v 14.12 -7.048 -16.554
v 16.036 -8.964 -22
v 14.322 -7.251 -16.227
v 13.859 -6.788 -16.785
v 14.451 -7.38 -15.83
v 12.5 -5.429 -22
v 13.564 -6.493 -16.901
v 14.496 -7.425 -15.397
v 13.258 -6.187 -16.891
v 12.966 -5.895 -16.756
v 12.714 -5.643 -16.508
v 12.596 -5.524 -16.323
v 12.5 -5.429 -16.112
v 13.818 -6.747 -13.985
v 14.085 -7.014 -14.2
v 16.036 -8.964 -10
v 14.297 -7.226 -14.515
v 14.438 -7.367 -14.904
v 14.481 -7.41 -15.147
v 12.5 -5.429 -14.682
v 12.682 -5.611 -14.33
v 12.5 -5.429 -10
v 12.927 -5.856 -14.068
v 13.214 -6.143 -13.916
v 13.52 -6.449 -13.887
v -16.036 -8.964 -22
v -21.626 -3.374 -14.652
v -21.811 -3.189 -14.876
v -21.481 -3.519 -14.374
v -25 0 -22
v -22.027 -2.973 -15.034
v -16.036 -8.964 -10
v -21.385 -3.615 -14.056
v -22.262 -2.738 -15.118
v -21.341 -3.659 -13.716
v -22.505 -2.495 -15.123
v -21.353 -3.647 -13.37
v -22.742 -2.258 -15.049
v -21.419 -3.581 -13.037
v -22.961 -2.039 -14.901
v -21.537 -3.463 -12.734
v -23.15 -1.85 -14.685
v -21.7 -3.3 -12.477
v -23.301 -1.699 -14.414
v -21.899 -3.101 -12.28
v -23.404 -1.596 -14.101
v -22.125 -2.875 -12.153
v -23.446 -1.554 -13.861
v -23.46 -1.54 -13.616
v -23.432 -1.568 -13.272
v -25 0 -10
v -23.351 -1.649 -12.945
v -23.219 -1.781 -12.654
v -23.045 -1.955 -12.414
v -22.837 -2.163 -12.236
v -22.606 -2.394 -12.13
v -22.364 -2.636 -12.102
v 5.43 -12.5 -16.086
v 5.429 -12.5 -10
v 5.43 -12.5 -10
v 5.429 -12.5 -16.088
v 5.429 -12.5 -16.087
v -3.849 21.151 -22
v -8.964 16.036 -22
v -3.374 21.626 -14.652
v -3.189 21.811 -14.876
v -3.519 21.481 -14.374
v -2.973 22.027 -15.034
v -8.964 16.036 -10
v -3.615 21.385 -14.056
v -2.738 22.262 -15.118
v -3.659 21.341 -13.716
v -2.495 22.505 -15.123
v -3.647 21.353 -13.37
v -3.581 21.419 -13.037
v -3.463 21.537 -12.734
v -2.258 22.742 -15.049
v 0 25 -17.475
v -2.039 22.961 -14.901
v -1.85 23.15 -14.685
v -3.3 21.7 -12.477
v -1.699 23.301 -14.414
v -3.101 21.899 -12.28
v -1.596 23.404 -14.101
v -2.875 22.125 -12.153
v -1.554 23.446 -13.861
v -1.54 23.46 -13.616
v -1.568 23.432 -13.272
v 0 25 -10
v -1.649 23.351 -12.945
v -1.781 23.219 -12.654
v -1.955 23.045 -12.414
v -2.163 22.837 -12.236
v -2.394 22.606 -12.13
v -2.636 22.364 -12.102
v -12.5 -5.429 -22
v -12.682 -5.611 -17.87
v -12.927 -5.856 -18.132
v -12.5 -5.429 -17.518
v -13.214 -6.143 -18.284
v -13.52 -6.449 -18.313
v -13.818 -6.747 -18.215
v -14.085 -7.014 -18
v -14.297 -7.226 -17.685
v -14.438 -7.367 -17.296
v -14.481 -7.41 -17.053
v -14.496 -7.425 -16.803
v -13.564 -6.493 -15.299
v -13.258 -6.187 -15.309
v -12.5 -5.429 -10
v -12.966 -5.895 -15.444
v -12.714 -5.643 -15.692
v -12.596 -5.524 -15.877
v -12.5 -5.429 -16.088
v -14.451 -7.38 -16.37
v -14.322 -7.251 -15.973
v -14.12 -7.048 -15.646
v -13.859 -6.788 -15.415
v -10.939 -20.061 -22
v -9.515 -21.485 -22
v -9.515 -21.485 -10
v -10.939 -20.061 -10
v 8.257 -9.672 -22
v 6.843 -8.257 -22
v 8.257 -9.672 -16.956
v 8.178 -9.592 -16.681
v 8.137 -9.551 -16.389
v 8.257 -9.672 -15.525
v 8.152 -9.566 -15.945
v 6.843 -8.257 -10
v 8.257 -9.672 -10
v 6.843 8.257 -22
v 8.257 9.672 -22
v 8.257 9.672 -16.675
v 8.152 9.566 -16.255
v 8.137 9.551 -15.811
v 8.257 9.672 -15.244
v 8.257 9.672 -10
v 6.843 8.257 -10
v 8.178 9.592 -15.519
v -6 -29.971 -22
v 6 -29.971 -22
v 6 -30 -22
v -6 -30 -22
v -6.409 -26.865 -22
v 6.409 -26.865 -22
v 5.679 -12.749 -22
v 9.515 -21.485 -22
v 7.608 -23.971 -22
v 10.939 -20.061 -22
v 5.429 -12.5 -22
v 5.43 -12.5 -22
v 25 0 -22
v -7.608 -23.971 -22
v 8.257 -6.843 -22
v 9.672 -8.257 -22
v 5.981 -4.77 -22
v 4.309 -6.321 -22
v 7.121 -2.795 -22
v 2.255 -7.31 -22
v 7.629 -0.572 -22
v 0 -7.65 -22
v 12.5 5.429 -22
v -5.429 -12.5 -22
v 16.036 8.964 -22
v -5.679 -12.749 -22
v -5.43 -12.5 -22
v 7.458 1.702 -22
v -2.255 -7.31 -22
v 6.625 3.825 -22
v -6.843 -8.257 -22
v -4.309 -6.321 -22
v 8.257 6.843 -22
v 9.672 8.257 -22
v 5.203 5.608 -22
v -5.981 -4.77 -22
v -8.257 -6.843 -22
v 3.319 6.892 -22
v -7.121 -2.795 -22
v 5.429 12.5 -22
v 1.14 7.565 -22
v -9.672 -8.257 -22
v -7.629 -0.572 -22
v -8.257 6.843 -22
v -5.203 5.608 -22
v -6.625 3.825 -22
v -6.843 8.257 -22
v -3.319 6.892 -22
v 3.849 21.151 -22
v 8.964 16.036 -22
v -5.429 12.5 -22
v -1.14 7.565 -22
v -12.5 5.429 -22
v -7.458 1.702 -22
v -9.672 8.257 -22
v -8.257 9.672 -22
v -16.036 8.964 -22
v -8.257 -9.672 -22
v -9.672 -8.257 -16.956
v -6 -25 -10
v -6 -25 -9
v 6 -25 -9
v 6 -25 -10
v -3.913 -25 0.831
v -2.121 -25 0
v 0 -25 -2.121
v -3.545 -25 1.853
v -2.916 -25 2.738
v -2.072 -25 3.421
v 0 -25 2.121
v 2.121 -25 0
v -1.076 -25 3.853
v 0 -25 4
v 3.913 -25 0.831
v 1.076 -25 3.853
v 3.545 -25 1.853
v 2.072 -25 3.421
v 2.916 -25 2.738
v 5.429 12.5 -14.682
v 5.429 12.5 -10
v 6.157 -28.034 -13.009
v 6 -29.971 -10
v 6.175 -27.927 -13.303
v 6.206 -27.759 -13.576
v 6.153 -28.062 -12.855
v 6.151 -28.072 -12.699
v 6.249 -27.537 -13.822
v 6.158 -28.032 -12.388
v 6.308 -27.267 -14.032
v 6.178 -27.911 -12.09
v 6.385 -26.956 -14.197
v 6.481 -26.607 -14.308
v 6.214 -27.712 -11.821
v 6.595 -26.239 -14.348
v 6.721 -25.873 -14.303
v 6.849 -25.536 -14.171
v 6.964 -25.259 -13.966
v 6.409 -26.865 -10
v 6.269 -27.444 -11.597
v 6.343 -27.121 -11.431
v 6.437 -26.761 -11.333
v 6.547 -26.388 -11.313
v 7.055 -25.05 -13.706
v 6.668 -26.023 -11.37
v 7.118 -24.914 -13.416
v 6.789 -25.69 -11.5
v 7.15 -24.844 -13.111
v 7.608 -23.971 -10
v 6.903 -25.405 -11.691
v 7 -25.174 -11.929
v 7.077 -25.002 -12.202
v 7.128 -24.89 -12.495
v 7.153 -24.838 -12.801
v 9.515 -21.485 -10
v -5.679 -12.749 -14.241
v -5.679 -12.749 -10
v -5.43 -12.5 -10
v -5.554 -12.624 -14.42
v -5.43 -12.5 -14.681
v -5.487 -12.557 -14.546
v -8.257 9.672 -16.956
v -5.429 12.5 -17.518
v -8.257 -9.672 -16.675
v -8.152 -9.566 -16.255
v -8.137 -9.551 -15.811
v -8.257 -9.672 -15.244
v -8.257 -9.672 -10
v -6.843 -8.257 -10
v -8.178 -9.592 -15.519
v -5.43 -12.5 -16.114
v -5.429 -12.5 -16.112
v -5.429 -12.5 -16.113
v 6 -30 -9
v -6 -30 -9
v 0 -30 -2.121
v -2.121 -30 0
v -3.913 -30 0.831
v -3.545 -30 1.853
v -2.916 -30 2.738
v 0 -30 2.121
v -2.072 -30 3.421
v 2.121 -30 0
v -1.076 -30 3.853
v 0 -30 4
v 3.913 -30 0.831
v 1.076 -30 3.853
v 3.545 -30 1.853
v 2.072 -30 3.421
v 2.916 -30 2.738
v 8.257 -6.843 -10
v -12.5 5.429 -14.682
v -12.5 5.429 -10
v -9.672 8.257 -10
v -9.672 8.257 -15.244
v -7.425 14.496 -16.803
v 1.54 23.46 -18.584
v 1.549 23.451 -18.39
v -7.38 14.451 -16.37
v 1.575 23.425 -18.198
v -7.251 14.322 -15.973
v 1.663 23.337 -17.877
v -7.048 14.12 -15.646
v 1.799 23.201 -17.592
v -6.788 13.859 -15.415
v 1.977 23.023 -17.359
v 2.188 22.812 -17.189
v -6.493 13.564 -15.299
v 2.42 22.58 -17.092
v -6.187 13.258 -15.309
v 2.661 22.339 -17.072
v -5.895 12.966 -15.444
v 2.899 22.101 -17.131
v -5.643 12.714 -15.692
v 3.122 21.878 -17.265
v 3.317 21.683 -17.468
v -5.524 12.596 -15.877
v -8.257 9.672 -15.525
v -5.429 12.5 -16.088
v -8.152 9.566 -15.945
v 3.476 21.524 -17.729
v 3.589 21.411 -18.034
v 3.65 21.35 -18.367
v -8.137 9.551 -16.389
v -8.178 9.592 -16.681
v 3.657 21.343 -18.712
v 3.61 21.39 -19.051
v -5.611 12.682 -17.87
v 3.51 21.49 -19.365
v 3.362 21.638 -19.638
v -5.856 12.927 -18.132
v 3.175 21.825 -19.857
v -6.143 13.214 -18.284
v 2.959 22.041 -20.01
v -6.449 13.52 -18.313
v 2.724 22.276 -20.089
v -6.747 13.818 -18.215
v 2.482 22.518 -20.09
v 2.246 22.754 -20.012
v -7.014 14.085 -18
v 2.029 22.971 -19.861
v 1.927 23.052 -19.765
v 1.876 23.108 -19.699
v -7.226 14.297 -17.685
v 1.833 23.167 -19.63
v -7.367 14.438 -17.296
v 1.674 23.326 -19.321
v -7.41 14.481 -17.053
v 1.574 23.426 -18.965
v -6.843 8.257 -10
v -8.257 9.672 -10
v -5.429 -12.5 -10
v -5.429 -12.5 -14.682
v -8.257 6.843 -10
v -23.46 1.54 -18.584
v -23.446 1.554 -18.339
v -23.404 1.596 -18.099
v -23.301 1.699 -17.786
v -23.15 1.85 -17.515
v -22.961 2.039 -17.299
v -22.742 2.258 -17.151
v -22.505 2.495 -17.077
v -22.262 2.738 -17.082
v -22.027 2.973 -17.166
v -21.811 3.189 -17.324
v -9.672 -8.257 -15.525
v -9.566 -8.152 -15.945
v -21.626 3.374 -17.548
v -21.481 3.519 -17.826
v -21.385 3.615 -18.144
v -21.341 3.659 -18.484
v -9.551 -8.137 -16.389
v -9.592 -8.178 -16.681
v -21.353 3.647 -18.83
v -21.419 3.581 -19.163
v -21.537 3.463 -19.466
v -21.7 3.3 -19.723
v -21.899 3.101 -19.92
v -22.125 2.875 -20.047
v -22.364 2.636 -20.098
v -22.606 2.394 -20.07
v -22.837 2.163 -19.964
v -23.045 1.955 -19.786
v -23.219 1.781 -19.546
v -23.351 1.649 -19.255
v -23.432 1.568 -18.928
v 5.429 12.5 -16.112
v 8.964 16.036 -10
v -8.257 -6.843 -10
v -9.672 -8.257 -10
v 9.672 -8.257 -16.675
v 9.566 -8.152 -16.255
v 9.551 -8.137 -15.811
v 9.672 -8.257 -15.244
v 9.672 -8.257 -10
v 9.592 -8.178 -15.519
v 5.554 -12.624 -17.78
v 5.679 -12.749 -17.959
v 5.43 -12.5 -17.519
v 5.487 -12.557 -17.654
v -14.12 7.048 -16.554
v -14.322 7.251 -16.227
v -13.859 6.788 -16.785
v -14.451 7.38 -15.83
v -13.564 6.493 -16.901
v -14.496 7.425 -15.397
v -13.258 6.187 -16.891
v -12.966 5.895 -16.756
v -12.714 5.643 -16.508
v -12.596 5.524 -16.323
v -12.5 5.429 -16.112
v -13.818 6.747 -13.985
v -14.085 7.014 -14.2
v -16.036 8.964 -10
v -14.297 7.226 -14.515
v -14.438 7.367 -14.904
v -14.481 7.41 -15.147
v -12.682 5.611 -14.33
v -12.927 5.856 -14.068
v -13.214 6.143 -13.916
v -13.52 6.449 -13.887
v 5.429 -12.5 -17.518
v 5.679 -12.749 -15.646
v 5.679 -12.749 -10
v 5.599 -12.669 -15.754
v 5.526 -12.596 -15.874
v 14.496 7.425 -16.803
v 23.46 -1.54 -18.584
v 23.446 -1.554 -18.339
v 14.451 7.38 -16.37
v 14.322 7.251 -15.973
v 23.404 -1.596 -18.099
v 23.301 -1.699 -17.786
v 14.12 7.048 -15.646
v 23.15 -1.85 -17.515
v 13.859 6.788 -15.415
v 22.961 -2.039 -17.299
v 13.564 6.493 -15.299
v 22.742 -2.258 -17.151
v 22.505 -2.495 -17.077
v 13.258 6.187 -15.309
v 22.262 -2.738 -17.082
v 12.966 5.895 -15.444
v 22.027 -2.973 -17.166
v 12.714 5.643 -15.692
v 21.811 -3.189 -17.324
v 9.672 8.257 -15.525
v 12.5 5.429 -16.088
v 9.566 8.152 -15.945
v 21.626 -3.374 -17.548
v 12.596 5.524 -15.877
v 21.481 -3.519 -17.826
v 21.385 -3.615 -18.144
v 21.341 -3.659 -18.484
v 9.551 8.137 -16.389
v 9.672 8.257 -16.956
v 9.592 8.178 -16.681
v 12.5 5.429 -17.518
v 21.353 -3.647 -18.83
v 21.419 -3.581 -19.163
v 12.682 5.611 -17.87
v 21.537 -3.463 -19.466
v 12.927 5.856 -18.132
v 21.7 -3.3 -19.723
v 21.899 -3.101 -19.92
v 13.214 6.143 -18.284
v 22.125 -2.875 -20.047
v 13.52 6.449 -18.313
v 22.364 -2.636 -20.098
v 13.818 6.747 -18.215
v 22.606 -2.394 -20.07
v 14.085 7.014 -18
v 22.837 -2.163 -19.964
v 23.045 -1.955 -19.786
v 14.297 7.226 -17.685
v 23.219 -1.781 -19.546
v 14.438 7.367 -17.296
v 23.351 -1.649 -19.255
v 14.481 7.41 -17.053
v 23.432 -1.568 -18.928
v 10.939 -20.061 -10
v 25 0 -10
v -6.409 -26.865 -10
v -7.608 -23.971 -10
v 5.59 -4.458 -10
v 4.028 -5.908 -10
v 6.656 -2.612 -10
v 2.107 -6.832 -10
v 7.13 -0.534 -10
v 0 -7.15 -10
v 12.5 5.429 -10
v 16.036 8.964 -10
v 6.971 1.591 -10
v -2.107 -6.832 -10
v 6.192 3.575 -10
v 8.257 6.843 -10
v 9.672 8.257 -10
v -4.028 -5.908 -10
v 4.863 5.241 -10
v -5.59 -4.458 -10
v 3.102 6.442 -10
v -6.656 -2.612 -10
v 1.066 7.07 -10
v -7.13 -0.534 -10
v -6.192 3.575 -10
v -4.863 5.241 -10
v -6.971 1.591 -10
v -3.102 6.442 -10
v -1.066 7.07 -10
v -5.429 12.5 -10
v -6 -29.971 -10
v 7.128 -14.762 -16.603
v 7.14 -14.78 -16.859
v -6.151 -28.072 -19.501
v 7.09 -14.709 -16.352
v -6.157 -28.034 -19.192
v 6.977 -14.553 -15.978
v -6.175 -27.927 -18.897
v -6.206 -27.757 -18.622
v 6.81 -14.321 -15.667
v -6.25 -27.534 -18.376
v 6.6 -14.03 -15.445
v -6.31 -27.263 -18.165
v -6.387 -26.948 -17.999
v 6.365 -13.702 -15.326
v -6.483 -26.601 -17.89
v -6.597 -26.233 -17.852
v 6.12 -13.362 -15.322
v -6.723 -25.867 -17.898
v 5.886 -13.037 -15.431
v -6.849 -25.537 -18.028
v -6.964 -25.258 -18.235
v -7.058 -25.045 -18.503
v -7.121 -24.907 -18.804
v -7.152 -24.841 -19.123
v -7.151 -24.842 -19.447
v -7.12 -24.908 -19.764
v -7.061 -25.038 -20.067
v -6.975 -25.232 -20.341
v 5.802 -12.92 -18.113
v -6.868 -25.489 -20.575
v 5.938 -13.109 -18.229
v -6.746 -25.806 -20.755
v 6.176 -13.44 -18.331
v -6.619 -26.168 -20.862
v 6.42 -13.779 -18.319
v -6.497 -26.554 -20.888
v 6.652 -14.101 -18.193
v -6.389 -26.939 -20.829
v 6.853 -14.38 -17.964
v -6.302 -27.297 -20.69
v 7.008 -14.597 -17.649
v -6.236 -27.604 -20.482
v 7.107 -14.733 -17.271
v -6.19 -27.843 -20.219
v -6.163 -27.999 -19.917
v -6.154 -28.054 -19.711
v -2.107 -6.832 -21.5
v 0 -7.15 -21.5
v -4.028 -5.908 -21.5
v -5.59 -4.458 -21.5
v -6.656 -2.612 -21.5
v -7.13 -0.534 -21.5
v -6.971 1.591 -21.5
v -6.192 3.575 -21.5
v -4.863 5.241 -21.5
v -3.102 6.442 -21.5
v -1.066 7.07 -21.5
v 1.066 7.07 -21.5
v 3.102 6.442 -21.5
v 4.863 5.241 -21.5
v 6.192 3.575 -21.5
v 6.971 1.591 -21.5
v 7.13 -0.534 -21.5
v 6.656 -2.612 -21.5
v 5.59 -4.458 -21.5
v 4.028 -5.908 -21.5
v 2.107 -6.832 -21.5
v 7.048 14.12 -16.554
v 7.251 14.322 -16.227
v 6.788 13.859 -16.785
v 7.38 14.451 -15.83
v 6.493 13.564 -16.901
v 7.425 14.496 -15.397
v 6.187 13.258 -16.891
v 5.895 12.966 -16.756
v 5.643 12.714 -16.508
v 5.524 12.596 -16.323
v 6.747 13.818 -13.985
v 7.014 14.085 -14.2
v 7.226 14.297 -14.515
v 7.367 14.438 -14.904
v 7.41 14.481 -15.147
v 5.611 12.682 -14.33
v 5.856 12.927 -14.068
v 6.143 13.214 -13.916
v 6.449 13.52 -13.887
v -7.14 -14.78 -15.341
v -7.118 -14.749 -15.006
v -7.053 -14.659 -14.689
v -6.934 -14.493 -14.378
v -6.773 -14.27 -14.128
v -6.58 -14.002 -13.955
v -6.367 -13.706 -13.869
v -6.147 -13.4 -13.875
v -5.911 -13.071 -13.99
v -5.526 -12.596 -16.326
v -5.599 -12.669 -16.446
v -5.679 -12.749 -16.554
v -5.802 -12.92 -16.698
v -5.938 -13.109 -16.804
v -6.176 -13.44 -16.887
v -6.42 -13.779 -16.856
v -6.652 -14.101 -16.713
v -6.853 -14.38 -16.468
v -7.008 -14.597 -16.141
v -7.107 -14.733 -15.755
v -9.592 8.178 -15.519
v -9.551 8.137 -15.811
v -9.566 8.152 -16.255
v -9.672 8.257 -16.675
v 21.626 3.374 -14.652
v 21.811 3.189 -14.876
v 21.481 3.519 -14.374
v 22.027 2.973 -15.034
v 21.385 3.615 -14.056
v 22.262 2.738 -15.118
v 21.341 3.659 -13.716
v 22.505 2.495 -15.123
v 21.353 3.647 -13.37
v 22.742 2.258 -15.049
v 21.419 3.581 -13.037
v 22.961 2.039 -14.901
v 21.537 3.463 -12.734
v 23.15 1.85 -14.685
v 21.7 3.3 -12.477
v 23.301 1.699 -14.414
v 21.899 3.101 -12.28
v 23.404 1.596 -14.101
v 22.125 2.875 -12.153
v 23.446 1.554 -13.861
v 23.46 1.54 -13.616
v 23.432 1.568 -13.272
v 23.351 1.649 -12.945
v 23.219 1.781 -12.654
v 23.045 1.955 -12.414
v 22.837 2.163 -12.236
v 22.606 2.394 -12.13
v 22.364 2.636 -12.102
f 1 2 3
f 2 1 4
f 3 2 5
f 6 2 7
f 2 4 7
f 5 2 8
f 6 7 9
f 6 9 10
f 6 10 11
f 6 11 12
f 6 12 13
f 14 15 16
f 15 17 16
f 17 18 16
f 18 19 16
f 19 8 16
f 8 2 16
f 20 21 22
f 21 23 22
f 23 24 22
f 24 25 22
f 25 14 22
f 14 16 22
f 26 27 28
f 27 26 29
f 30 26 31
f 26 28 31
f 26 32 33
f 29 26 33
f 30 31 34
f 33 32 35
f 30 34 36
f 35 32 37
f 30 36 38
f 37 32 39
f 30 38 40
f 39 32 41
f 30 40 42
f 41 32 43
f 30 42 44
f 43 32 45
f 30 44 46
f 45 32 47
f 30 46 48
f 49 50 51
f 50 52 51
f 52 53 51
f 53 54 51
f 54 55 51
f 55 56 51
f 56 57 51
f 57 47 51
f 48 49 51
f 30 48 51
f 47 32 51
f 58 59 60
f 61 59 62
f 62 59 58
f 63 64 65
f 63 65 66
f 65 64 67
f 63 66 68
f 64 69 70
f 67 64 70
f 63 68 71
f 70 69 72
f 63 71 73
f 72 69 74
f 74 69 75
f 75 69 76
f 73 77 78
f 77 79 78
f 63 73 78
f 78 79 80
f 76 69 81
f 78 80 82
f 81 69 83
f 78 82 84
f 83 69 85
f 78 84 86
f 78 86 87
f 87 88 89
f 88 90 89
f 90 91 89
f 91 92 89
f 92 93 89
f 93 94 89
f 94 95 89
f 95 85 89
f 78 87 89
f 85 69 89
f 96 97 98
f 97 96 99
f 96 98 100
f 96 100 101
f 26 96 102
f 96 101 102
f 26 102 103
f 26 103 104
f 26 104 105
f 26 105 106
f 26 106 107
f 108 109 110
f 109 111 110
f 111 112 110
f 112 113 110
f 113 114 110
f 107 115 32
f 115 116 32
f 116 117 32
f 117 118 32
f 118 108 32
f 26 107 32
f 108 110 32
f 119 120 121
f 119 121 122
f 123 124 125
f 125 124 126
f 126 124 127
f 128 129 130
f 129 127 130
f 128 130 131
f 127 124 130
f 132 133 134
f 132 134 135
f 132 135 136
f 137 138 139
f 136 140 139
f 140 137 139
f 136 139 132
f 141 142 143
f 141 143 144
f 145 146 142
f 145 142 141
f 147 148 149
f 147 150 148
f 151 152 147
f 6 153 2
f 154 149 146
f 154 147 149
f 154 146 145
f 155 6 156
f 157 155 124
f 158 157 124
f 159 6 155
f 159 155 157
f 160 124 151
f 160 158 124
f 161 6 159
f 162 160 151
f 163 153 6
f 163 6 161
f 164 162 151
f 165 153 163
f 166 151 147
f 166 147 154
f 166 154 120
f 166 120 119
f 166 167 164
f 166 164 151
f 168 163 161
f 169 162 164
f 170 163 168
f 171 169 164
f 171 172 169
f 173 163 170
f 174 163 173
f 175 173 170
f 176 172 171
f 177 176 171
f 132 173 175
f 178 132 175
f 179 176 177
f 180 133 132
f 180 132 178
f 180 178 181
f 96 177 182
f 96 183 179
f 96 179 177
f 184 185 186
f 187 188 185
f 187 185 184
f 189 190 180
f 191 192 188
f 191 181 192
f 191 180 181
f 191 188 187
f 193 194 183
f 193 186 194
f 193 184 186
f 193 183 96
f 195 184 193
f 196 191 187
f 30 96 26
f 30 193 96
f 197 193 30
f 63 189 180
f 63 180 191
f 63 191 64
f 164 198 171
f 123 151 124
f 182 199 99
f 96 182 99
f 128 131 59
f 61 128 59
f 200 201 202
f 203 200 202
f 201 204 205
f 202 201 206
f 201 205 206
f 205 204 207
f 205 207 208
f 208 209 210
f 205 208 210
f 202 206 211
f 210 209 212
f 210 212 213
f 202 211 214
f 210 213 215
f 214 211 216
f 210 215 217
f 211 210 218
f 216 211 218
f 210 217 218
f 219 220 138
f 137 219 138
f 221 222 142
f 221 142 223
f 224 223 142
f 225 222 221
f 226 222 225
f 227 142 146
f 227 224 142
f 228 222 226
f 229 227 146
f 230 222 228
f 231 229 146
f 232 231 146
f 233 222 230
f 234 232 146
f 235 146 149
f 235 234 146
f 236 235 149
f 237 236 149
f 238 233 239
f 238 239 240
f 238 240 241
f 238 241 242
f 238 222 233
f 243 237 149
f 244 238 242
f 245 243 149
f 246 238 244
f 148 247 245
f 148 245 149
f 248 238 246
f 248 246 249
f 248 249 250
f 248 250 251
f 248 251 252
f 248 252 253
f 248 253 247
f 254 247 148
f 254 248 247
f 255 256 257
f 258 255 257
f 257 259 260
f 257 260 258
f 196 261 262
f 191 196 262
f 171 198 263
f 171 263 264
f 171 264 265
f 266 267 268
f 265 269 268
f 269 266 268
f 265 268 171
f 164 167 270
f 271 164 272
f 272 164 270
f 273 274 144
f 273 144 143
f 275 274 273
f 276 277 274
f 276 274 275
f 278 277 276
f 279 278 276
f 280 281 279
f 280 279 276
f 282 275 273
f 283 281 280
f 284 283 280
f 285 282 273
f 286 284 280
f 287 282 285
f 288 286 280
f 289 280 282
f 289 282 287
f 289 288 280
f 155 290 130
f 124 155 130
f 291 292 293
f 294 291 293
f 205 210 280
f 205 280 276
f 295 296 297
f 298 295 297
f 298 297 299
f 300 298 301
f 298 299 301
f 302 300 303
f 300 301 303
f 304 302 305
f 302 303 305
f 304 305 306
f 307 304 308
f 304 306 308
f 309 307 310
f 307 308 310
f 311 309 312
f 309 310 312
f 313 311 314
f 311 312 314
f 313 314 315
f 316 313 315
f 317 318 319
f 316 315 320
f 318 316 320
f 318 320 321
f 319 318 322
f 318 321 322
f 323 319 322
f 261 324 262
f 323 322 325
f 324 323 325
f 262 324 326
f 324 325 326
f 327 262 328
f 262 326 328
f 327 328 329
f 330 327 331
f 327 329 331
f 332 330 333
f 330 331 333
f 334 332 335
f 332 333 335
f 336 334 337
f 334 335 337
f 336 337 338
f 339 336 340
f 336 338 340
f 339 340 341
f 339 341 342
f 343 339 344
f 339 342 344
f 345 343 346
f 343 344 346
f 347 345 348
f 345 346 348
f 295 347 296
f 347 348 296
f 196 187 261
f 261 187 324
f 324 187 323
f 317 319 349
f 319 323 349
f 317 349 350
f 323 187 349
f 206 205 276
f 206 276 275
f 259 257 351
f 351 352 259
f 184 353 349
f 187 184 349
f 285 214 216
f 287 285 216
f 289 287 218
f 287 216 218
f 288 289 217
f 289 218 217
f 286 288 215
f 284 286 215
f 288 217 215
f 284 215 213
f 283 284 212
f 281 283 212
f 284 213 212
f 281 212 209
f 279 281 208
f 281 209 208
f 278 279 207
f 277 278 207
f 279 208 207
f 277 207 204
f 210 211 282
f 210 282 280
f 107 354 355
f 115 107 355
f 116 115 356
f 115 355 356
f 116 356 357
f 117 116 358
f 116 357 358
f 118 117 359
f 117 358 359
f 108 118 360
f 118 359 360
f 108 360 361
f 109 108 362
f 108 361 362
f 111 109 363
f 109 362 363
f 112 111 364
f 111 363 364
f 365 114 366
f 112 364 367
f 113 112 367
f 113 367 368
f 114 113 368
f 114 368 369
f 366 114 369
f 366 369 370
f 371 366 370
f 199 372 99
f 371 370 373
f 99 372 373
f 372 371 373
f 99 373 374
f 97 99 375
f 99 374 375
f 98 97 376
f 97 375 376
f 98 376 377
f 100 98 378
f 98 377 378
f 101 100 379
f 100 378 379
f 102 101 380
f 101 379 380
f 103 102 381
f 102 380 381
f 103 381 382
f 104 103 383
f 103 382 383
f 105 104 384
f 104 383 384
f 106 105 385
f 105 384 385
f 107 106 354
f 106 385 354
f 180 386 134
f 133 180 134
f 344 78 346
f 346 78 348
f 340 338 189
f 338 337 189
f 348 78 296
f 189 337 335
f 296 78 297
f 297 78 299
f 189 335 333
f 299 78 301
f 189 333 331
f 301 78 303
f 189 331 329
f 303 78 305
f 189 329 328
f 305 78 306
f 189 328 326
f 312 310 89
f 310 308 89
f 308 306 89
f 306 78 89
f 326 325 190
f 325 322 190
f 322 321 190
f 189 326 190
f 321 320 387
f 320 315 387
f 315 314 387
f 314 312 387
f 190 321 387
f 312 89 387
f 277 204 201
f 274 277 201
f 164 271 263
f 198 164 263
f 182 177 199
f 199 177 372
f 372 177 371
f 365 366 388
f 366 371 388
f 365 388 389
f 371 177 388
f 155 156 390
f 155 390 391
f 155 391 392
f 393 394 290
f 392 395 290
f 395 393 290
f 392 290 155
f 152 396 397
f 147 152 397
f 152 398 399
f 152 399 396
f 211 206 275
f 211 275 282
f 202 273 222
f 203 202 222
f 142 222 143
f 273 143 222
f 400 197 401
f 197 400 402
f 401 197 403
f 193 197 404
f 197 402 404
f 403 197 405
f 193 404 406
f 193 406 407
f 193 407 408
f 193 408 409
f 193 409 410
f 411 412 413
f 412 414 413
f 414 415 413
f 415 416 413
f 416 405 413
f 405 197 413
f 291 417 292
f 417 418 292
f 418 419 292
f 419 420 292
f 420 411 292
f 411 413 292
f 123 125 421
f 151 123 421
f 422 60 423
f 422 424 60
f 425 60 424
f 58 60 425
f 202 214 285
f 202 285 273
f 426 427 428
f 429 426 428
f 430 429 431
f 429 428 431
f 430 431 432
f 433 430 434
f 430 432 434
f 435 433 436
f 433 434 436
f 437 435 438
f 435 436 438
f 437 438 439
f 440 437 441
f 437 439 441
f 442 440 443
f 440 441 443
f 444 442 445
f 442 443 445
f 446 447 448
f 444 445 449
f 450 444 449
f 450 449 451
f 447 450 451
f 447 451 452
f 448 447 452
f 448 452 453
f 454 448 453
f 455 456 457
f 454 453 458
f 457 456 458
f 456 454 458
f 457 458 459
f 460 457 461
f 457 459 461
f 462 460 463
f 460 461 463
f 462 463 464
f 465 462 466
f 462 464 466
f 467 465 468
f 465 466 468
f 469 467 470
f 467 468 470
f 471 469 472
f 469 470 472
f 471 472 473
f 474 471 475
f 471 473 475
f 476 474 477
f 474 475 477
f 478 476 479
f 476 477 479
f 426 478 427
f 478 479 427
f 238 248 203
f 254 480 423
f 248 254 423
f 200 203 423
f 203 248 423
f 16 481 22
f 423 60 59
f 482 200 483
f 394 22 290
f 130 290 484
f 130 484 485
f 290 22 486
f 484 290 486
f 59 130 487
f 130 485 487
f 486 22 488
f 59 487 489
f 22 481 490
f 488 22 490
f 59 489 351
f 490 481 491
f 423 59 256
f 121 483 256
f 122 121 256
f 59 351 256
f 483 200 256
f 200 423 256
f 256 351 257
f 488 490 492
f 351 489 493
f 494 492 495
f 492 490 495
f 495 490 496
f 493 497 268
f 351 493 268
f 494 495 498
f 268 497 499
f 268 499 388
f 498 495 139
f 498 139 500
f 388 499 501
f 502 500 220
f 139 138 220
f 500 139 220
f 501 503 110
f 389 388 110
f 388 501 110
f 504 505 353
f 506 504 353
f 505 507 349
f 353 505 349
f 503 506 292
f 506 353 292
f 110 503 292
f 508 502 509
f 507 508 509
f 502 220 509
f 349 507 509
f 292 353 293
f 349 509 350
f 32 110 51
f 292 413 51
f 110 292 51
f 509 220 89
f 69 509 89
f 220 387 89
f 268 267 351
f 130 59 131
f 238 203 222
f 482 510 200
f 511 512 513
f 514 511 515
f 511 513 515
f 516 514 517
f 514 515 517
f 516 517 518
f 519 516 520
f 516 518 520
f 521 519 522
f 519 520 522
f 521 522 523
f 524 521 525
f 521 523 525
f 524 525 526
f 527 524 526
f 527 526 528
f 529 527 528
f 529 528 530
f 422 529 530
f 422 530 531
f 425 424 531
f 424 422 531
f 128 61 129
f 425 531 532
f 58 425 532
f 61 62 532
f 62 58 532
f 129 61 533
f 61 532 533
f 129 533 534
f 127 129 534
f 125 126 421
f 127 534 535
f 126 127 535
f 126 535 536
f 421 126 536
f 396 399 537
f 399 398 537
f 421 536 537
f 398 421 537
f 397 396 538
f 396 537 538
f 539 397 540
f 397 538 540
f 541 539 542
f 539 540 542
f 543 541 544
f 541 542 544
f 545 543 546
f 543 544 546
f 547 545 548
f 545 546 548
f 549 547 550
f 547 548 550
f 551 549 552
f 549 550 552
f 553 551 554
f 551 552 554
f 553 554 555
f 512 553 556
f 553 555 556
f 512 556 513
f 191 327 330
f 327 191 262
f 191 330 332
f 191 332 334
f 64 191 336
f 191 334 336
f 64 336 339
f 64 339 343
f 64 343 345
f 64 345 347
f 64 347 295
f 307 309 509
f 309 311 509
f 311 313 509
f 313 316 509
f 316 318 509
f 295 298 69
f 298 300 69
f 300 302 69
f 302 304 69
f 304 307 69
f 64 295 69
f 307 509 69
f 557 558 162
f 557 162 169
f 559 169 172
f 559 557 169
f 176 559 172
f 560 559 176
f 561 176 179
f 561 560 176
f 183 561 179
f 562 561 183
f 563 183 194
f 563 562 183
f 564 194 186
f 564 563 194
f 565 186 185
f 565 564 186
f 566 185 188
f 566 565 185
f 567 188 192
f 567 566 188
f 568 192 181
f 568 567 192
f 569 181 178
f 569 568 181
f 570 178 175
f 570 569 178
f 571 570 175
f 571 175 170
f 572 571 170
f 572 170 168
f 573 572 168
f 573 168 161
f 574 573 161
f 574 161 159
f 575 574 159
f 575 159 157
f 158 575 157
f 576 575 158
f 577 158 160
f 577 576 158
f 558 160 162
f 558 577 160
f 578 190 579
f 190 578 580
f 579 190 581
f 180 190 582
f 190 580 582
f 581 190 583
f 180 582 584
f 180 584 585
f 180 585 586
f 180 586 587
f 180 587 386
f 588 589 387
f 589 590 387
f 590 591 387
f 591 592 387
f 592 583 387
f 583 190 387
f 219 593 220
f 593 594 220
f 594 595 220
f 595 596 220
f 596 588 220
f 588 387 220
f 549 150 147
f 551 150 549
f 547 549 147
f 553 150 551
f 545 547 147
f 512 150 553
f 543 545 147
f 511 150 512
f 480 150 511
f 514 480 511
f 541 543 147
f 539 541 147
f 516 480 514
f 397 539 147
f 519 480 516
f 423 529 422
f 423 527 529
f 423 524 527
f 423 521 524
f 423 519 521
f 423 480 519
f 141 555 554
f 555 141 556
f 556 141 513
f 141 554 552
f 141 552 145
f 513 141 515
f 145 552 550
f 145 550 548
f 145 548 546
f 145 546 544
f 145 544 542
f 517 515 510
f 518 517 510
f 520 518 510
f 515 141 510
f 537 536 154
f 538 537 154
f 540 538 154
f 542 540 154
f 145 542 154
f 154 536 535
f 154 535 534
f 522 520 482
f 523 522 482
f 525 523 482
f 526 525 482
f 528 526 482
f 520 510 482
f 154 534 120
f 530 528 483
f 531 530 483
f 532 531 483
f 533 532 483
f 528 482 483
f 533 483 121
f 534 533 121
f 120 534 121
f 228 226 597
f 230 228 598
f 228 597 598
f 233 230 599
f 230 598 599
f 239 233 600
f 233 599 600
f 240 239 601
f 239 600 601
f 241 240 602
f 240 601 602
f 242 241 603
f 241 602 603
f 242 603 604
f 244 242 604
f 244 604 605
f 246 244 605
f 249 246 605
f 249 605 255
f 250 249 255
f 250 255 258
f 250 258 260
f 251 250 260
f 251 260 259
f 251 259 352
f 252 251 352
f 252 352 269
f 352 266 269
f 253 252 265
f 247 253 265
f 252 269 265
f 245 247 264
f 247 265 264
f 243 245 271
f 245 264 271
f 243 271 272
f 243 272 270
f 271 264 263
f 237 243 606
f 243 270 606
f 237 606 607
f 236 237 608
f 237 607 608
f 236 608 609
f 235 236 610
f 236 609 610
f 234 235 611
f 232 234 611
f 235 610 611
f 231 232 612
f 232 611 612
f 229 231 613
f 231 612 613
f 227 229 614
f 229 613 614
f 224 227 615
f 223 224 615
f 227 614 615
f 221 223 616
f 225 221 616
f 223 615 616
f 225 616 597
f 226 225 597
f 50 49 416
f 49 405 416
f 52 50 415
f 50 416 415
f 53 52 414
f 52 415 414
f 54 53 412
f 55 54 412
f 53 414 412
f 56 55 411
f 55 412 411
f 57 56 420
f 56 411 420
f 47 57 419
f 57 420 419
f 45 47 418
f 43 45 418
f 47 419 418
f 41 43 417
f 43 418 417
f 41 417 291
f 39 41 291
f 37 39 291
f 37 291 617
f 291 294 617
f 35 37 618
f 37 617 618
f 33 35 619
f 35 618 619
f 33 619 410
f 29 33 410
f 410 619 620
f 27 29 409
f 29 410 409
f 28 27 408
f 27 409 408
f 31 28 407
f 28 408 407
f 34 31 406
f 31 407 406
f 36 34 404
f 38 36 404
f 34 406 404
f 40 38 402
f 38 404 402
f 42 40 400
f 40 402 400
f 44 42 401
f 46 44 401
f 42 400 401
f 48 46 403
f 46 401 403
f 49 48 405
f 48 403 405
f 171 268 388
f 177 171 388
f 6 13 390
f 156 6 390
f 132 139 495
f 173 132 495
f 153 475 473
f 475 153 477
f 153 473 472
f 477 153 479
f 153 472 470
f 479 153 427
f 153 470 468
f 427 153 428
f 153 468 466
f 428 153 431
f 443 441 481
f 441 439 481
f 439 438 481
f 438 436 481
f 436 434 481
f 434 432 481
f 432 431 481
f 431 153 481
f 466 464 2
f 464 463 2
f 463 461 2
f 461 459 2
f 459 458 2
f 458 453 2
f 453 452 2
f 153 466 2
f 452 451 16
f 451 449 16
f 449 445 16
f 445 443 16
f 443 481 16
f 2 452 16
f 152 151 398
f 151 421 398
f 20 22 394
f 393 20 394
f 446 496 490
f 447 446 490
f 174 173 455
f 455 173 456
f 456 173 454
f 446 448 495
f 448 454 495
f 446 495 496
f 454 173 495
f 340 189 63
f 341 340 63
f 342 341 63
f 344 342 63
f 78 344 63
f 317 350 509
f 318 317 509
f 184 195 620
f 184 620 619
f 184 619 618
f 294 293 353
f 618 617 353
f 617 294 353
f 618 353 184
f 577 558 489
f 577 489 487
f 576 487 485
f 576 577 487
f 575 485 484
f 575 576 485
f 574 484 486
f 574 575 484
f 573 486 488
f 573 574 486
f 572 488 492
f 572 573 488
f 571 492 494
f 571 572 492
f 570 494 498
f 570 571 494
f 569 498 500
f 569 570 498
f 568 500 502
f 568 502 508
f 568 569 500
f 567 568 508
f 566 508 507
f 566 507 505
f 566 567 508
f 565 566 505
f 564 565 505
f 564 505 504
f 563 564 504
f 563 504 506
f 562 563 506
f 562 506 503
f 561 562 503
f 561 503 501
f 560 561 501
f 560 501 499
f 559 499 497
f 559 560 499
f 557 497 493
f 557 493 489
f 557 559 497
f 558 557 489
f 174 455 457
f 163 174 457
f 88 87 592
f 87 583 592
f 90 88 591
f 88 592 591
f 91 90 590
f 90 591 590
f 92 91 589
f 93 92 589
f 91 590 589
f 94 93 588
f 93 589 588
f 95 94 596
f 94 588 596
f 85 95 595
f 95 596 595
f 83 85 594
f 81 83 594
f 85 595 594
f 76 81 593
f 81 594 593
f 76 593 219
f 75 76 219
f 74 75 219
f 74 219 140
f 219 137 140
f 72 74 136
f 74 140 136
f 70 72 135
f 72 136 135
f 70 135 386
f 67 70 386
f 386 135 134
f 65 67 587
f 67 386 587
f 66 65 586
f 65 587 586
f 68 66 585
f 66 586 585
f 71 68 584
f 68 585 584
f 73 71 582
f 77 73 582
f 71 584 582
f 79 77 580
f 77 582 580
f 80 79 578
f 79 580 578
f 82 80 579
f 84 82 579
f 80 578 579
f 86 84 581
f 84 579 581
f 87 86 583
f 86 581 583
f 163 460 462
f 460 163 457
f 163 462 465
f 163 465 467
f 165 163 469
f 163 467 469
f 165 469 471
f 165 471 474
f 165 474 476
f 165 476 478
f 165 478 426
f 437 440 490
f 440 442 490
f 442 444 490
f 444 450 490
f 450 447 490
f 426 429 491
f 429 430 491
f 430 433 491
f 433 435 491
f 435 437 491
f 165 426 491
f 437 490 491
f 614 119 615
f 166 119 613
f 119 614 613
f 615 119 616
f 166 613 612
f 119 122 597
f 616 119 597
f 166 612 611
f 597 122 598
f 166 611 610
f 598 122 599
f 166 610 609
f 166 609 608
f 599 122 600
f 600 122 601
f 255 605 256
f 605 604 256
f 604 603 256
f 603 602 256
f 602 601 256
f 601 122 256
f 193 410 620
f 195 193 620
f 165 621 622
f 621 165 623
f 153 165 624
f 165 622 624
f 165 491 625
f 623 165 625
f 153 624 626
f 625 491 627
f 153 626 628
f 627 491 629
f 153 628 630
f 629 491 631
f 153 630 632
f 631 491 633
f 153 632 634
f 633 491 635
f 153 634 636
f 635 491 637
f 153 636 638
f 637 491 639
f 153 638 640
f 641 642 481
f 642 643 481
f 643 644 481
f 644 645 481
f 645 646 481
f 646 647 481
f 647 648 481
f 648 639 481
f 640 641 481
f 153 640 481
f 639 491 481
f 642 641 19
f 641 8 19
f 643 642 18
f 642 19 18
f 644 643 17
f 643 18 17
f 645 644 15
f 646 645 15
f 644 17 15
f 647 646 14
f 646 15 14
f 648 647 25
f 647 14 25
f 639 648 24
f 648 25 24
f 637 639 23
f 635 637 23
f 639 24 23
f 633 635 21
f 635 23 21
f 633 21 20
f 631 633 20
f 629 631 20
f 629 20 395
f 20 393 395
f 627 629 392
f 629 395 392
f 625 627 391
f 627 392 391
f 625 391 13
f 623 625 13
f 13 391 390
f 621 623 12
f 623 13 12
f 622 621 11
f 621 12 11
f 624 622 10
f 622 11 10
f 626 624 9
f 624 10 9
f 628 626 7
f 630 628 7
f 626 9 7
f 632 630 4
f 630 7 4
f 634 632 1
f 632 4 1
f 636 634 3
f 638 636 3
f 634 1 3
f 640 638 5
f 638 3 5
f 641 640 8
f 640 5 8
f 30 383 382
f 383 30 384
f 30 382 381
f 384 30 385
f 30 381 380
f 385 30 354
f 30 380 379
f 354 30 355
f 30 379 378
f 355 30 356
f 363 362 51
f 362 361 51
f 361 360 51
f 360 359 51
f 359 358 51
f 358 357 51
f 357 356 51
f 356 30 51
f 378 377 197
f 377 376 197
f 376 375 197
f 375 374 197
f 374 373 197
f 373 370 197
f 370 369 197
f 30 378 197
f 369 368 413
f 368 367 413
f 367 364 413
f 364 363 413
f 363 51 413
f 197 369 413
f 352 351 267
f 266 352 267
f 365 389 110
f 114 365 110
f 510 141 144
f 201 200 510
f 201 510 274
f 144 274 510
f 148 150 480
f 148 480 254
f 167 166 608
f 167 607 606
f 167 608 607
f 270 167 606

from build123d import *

# Parameters (mm, degrees)
PAD081_DEPTH          = 12
SKETCH230_R           = 7.15
POCKET159_DEPTH       = 20
POLARPATTERN_COUNT    = 4
PAD106_DEPTH          = 12
PAD105_DEPTH          = 5
SKETCH266_R           = 1.5
POCKET160_DEPTH       = 30
FILLET005_R           = 12
POLARPATTERN002_COUNT = 4
POCKET162_DEPTH       = 5
POCKET178_DEPTH       = 13
CHAMFER044_SIZE       = 0.5


with BuildPart() as part:
    # Sketch232 → Pad081 (new body)
    with BuildSketch(Plane.XY.offset(-10)):
        Polygon((0, 0), (0, 25), (8.9644660941, 16.0355339059), (5.4289321881, 12.5), (8.2573593129, 9.6715728753), (6.8431457505, 8.2573593129), (8.2573593129, 6.8431457505), (9.6715728753, 8.2573593129), (12.5, 5.4289321881), (16.0355339059, 8.9644660941), (25, 0), align=None)
    pad081 = extrude(amount=-PAD081_DEPTH)

    # Sketch230 → Pocket159 (cut)
    with BuildSketch(Plane.XY.offset(-23)):
        Circle(SKETCH230_R)
    pocket159 = extrude(amount=POCKET159_DEPTH, mode=Mode.SUBTRACT)

    # PolarPattern: Pad081, Pocket159 ×4 about axis
    polarpattern_axis = Axis((0, 0, -10), (0, 0, 1))
    for i in range(1, POLARPATTERN_COUNT):
        add(pad081.rotate(polarpattern_axis, i * 360 / POLARPATTERN_COUNT))
        add(pocket159.rotate(polarpattern_axis, i * 360 / POLARPATTERN_COUNT), mode=Mode.SUBTRACT)

    # Sketch297 → Pad106 (join)
    with BuildSketch(Plane.XY.offset(-22)):
        Polygon((-11.965, -19.035), (-5.43, -12.5), (5.43, -12.5), (11.965, -19.035), (6, -25), (-6, -25), align=None)
    extrude(amount=PAD106_DEPTH)

    # Sketch296 → Pad105 (join)
    with BuildSketch(Plane.XZ.offset(25)):
        with BuildLine():
            Line((-3.9127822424, 0.8307437172), (-6, -9))
            Line((-6, -22), (-6, -9))
            Line((6, -22), (-6, -22))
            Line((6, -9), (6, -22))
            Line((3.9127822424, 0.8307437172), (6, -9))
            ThreePointArc((3.9127822424, 0.8307437172), (0, 4), (-3.9127822424, 0.8307437172))
        make_face()
        Polygon((-2.1213203436, 0), (0, -2.1213203436), (2.1213203436, 0), (0, 2.1213203436), align=None, mode=Mode.SUBTRACT)
    extrude(amount=PAD105_DEPTH)

    # Sketch266 (on DatumPlane) → Pocket160 (cut, symmetric)
    with BuildSketch(Plane(origin=(2.8284271247, -2.8284271247, 0), x_dir=(0.7071067812, 0.7071067812, 0), z_dir=(0.7002252666, -0.7002252666, -0.139173101))):
        with Locations((14, -16.5)):
            Circle(SKETCH266_R)
    pocket160 = extrude(amount=POCKET160_DEPTH, both=True, mode=Mode.SUBTRACT)

    # Fillet005
    fillet005_edges = [part.edges().sort_by_distance(p)[0] for p in [
        (-6, -25, -16),
        (6, -25, -16),
    ]]
    fillet(fillet005_edges, radius=FILLET005_R)

    # PolarPattern002: Pocket160 ×4 about axis
    polarpattern002_axis = Axis((0, 0, 0), (0, 0, 1))
    for i in range(1, POLARPATTERN002_COUNT):
        add(pocket160.rotate(polarpattern002_axis, i * 360 / POLARPATTERN002_COUNT), mode=Mode.SUBTRACT)

    # Sketch272 → Pocket162 (cut, symmetric)
    with BuildSketch(Plane.YZ):
        Polygon((20.3, -23), (26, -16.3), (26, -23), align=None)
    extrude(amount=POCKET162_DEPTH, both=True, mode=Mode.SUBTRACT)

    # Sketch303 → Pocket178 (cut)
    with BuildSketch(Plane.XY.offset(-10)):
        Polygon((-5.5, -12.5), (-12, -19), (-10.9393398282, -20.0606601718), align=None)
        Polygon((5.5, -12.5), (12, -19), (10.9393398282, -20.0606601718), align=None)
    extrude(amount=-POCKET178_DEPTH, mode=Mode.SUBTRACT)

    # Chamfer044
    chamfer044_edges = [part.edges().sort_by_distance(p)[0] for p in [
        (-5.055813, 5.055813, -22),
    ]]
    chamfer(chamfer044_edges, length=CHAMFER044_SIZE)


solid = part.part
